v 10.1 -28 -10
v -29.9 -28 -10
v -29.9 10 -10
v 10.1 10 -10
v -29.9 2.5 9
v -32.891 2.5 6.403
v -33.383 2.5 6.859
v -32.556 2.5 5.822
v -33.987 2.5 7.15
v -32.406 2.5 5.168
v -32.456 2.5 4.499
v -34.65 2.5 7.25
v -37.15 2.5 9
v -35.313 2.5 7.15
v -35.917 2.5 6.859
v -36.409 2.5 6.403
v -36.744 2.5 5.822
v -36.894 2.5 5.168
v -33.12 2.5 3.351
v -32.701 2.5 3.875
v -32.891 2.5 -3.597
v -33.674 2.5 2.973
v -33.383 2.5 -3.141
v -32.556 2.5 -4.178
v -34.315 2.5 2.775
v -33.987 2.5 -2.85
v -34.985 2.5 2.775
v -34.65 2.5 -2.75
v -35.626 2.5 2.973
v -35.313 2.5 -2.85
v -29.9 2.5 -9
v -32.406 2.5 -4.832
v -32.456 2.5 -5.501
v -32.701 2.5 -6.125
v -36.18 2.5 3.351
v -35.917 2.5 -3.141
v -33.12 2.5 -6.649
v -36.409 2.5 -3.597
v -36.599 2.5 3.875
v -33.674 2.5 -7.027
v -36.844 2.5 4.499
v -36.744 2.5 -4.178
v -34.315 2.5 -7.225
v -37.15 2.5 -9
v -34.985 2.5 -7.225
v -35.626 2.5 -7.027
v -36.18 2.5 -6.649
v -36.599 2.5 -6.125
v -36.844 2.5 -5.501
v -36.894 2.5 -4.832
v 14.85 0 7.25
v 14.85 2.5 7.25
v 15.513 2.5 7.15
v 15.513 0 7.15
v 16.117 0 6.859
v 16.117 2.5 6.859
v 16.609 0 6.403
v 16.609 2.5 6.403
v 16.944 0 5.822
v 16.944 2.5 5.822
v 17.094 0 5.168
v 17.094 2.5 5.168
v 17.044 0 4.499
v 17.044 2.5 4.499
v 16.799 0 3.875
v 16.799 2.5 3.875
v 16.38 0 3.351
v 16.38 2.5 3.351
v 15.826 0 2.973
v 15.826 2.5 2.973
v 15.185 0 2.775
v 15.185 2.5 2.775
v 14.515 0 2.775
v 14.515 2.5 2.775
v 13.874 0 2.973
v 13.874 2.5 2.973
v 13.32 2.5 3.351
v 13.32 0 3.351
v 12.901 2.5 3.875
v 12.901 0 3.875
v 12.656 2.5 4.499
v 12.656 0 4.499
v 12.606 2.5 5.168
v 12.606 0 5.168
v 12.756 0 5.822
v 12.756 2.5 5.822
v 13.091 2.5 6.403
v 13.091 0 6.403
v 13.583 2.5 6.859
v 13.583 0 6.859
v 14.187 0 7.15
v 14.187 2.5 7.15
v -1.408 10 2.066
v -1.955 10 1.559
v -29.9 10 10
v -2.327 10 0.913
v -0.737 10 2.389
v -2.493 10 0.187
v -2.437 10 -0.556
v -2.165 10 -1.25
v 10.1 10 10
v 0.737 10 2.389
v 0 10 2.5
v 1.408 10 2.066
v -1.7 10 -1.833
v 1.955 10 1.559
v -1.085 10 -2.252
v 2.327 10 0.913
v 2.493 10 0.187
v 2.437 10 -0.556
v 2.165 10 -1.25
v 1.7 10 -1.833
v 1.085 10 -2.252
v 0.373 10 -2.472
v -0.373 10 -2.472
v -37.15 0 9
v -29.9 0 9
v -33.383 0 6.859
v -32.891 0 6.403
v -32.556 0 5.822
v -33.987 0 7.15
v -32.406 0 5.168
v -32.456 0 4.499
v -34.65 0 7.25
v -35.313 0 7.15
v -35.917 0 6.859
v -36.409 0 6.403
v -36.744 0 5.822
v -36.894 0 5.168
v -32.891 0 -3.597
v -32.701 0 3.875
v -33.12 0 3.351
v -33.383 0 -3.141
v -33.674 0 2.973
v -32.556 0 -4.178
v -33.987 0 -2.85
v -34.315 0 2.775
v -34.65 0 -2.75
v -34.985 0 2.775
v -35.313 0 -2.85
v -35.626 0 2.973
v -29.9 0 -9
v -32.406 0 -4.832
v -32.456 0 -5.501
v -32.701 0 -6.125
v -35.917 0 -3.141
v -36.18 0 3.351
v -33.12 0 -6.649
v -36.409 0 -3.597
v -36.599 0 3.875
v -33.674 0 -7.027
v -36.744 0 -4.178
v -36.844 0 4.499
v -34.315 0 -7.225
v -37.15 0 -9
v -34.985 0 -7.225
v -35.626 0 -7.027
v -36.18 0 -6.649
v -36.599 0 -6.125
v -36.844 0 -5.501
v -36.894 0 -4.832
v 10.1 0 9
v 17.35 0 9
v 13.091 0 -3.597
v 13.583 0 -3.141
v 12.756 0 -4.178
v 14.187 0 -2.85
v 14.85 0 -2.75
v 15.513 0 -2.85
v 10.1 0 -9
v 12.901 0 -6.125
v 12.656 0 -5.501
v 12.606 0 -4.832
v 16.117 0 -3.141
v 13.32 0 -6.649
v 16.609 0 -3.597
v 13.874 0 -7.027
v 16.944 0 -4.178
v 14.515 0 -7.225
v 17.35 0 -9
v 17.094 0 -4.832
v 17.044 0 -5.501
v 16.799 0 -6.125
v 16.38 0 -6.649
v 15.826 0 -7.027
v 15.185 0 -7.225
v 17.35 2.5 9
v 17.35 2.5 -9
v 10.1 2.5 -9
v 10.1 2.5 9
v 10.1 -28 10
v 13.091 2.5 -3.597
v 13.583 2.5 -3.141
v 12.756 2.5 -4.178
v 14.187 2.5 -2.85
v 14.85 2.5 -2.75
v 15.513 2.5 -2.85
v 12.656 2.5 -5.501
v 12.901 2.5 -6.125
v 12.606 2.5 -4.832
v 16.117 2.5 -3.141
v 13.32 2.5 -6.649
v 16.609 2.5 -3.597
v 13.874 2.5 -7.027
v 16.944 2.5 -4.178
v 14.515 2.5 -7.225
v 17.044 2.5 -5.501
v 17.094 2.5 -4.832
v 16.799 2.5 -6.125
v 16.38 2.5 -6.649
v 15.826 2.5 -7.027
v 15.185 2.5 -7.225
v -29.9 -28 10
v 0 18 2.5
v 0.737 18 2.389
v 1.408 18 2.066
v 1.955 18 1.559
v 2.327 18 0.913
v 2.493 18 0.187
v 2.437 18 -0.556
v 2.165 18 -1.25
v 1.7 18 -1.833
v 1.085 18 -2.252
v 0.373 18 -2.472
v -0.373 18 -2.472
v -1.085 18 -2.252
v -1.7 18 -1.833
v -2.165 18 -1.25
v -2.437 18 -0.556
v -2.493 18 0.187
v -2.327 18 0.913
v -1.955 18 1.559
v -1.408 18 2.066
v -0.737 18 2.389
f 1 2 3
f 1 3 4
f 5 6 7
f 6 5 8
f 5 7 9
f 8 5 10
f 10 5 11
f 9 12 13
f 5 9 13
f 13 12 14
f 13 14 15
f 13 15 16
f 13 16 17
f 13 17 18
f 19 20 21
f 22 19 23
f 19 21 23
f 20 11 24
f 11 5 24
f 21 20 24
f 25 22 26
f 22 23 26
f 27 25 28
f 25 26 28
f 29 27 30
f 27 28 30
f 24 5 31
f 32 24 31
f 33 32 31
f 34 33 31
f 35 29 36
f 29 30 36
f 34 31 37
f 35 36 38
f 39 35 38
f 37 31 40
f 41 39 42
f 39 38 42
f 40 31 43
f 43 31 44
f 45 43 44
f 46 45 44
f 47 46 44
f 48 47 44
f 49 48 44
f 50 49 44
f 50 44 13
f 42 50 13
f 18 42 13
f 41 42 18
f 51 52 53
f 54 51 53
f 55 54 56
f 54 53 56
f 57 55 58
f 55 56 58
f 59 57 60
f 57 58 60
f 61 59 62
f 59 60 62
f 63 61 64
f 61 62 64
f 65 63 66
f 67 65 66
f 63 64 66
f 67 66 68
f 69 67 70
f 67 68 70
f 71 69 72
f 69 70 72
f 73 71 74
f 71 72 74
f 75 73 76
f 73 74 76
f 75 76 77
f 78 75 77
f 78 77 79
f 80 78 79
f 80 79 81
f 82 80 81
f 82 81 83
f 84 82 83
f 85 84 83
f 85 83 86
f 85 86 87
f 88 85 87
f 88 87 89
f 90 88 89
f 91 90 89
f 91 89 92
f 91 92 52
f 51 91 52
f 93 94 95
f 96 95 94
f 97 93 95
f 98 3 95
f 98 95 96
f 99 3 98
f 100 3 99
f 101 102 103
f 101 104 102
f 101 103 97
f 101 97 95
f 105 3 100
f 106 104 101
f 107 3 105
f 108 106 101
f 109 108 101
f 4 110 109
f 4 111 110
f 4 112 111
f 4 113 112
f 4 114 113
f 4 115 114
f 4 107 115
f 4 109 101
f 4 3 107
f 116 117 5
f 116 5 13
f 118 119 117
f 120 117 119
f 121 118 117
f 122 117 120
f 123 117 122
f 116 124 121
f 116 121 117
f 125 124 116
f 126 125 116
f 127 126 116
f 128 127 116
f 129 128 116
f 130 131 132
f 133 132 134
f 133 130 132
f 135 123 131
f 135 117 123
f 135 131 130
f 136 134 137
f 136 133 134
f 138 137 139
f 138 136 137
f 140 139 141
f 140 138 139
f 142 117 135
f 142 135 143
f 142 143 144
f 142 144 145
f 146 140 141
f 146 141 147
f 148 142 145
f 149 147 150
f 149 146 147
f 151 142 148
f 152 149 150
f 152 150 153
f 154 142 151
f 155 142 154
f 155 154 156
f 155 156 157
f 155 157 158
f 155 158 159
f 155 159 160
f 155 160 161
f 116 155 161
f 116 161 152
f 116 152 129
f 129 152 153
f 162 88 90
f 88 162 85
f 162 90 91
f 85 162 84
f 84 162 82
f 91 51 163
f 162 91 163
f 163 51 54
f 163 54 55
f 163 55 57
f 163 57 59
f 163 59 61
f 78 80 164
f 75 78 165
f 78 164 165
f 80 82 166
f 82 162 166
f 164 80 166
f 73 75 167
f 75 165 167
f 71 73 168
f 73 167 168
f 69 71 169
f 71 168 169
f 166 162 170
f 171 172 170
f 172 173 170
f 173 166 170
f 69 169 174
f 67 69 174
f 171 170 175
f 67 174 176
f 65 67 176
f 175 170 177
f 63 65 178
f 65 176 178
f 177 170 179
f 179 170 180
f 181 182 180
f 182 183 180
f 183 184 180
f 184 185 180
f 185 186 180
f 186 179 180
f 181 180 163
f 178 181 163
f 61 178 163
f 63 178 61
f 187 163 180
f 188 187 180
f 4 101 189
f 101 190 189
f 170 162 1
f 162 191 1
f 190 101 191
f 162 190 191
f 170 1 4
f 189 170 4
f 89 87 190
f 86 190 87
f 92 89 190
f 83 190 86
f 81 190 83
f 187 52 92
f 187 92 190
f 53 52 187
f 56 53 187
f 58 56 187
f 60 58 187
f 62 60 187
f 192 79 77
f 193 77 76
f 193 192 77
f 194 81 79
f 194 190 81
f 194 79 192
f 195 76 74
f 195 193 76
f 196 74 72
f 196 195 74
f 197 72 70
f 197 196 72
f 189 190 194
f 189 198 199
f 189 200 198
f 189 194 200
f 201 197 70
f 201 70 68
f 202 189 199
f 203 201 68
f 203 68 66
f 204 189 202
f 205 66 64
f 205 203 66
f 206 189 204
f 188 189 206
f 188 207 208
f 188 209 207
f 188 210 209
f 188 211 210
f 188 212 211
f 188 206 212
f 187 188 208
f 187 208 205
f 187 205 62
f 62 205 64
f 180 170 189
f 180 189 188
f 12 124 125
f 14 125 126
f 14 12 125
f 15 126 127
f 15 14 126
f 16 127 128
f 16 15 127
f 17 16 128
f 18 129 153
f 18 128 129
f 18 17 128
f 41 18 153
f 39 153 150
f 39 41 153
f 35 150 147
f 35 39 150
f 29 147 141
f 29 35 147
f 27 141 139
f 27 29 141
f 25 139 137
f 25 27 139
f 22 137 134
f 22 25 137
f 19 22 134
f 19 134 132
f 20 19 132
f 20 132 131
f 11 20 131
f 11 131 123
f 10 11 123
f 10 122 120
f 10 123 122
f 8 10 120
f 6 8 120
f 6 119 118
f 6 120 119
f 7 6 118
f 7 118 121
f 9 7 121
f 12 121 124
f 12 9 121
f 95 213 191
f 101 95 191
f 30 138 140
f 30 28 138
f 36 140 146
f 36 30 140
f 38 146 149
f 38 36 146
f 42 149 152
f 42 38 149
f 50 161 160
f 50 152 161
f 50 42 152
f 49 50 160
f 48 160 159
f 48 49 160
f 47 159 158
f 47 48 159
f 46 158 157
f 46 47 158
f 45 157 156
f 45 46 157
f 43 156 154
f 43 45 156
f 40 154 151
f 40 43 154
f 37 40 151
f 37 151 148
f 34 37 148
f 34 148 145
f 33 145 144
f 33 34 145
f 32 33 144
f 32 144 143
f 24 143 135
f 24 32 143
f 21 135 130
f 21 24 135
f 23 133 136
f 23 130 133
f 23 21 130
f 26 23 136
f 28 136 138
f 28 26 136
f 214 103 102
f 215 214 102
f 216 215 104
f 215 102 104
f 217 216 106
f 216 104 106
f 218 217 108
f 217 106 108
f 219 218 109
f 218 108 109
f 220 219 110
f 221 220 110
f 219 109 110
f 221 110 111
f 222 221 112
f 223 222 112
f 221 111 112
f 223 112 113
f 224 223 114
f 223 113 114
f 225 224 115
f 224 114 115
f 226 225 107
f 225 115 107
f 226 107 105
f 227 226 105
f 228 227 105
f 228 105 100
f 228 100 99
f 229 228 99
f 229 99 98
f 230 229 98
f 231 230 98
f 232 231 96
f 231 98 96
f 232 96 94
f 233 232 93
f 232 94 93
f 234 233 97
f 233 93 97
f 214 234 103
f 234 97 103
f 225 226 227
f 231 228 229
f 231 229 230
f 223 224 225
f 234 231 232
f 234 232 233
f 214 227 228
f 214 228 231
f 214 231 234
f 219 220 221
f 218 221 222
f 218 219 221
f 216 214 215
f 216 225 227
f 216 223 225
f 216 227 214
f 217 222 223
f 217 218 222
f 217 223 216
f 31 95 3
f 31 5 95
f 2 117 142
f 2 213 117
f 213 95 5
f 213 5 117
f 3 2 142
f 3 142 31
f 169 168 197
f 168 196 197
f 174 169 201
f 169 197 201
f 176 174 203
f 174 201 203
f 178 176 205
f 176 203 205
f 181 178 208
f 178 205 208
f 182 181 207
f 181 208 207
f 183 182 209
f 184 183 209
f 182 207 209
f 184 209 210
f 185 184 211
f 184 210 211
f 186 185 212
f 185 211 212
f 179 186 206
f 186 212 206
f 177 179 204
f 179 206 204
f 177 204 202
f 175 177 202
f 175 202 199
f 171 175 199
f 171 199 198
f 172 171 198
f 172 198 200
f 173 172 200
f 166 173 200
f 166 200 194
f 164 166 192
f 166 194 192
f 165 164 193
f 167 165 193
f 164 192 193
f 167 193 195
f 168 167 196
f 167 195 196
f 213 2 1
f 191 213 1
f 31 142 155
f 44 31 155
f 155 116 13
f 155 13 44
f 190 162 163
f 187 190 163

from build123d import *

# Parameters (mm, degrees)
BOSS_EXTRUDE1_DEPTH      = 10
BOSS_EXTRUDE1_DEPTH_BACK = 28
SKETCH1_W                = 40
SKETCH1_H                = 20
SKETCH2_R                = 2.5
BOSS_EXTRUDE2_DEPTH      = 8
SKETCH3_W                = 7.25
SKETCH3_H                = 18
BOSS_EXTRUDE3_DEPTH      = 2.5
SKETCH4_R                = 2.25
CUT_EXTRUDE1_DEPTH       = 44.866388044


with BuildPart() as part:
    # Sketch1 → Boss-Extrude1 (new, two sides: drawn at the far end of the back side and taken through both)
    with BuildSketch(Plane(origin=(0, 0, 0), x_dir=(1, 0, 0), z_dir=(0, 1, 0)).offset(-BOSS_EXTRUDE1_DEPTH_BACK)):
        with Locations((-9.9, 0)):
            Rectangle(SKETCH1_W, SKETCH1_H)
    extrude(amount=BOSS_EXTRUDE1_DEPTH + BOSS_EXTRUDE1_DEPTH_BACK)

    # Sketch2 → Boss-Extrude2 (add)
    with BuildSketch(Plane(origin=(0, 10, 0), x_dir=(1, 0, 0), z_dir=(0, 1, 0))):
        with Locations(Location((0, 0, 0), (0, 0, 270))):
            Circle(SKETCH2_R)
    extrude(amount=BOSS_EXTRUDE2_DEPTH)

    # Sketch3 → Boss-Extrude3 (add)
    with BuildSketch(Plane(origin=(0, 0, 0), x_dir=(1, 0, 0), z_dir=(0, 1, 0))):
        with Locations((13.725, 0)):
            Rectangle(SKETCH3_W, SKETCH3_H)
    boss_extrude3 = extrude(amount=BOSS_EXTRUDE3_DEPTH)

    # Sketch4 → Cut-Extrude1 (cut, symmetric)
    with BuildSketch(Plane(origin=(0, 2.5, 0), x_dir=(1, 0, 0), z_dir=(0, 1, 0))):
        with Locations(Location((14.85, -5, 0), (0, 0, 270))):
            Circle(SKETCH4_R)
        with Locations(Location((14.85, 5, 0), (0, 0, 270))):
            Circle(SKETCH4_R)
    cut_extrude1 = extrude(amount=CUT_EXTRUDE1_DEPTH, both=True, mode=Mode.SUBTRACT)

    # Mirror1: Boss-Extrude3, Cut-Extrude1 across plane
    add(boss_extrude3.mirror(Plane.ZY.offset(9.9)))
    add(cut_extrude1.mirror(Plane.ZY.offset(9.9)), mode=Mode.SUBTRACT)


solid = part.part
